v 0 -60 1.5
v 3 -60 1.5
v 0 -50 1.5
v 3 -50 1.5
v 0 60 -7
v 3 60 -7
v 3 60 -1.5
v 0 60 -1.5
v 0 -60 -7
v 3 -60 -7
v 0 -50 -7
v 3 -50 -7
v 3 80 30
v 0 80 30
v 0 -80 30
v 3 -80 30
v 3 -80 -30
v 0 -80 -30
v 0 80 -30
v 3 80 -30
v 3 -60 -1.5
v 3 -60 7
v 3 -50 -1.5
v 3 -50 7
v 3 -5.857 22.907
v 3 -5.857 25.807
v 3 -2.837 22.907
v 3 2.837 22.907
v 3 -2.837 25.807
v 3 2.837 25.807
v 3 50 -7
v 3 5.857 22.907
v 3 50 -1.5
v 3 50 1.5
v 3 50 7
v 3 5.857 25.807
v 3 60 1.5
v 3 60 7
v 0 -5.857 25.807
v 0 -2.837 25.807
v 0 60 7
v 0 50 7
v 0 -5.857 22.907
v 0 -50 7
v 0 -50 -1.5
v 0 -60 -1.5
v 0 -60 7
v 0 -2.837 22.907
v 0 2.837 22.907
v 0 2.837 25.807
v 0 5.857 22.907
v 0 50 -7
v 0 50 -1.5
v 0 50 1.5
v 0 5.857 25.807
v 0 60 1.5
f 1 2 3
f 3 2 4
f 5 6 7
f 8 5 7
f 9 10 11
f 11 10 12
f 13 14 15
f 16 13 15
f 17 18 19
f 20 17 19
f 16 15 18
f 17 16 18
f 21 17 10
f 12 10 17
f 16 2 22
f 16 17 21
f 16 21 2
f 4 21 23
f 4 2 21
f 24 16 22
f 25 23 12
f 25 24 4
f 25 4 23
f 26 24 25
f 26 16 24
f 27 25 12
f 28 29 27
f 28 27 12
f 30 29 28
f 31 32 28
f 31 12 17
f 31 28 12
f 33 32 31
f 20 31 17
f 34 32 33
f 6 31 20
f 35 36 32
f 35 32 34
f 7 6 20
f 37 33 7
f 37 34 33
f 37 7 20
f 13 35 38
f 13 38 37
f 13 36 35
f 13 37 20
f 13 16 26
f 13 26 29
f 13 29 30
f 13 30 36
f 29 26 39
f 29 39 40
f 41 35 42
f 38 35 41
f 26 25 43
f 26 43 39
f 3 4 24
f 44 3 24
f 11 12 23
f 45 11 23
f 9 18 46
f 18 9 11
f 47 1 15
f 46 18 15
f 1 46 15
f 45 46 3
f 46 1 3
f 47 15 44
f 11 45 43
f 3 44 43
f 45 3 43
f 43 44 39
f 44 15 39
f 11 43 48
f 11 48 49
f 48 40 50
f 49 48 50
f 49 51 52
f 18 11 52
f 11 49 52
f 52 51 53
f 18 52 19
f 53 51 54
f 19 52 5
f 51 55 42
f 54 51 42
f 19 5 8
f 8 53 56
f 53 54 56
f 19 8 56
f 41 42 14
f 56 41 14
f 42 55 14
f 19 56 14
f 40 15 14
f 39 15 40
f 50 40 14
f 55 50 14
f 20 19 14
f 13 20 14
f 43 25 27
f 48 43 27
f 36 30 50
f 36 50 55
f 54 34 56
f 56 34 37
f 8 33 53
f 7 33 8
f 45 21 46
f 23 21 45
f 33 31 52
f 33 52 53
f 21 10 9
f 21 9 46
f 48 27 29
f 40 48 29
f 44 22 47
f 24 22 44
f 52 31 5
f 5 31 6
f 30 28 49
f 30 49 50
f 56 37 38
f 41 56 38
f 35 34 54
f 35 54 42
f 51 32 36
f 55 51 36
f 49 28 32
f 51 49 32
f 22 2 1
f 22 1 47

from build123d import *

# Parameters (mm, degrees)
F1_DEPTH = 3
F2_W     = 10
F2_H     = 5.5
F3_DEPTH = 25
F4_W     = 3.02
F4_H     = 2.9
F5_DEPTH = 25


with BuildPart() as f1:
    # F0 (on Right) → F1 (new body)
    with BuildSketch(Plane.YZ):
        Polygon((80, 30), (0, 30), (-80, 30), (-80, -30), (0, -30), (80, -30), align=None)
    extrude(amount=F1_DEPTH)

    # F2 (on face) → F3 (cut)
    with BuildSketch(Plane.YZ.offset(3)):
        with Locations((-55, -4.25)):
            Rectangle(F2_W, F2_H)
        with Locations((-55, 4.25)):
            Rectangle(F2_W, F2_H)
        with Locations((55, 4.25)):
            Rectangle(F2_W, F2_H)
        with Locations((55, -4.25)):
            Rectangle(F2_W, F2_H)
    extrude(amount=-F3_DEPTH, mode=Mode.SUBTRACT)

    # F4 (on face) → F5 (cut)
    with BuildSketch(Plane.YZ.offset(3)):
        with Locations((-4.346554, 24.356653)):
            Rectangle(F4_W, F4_H)
        with Locations((4.346554, 24.356653)):
            Rectangle(F4_W, F4_H)
    extrude(amount=-F5_DEPTH, mode=Mode.SUBTRACT)


solid = f1.part
